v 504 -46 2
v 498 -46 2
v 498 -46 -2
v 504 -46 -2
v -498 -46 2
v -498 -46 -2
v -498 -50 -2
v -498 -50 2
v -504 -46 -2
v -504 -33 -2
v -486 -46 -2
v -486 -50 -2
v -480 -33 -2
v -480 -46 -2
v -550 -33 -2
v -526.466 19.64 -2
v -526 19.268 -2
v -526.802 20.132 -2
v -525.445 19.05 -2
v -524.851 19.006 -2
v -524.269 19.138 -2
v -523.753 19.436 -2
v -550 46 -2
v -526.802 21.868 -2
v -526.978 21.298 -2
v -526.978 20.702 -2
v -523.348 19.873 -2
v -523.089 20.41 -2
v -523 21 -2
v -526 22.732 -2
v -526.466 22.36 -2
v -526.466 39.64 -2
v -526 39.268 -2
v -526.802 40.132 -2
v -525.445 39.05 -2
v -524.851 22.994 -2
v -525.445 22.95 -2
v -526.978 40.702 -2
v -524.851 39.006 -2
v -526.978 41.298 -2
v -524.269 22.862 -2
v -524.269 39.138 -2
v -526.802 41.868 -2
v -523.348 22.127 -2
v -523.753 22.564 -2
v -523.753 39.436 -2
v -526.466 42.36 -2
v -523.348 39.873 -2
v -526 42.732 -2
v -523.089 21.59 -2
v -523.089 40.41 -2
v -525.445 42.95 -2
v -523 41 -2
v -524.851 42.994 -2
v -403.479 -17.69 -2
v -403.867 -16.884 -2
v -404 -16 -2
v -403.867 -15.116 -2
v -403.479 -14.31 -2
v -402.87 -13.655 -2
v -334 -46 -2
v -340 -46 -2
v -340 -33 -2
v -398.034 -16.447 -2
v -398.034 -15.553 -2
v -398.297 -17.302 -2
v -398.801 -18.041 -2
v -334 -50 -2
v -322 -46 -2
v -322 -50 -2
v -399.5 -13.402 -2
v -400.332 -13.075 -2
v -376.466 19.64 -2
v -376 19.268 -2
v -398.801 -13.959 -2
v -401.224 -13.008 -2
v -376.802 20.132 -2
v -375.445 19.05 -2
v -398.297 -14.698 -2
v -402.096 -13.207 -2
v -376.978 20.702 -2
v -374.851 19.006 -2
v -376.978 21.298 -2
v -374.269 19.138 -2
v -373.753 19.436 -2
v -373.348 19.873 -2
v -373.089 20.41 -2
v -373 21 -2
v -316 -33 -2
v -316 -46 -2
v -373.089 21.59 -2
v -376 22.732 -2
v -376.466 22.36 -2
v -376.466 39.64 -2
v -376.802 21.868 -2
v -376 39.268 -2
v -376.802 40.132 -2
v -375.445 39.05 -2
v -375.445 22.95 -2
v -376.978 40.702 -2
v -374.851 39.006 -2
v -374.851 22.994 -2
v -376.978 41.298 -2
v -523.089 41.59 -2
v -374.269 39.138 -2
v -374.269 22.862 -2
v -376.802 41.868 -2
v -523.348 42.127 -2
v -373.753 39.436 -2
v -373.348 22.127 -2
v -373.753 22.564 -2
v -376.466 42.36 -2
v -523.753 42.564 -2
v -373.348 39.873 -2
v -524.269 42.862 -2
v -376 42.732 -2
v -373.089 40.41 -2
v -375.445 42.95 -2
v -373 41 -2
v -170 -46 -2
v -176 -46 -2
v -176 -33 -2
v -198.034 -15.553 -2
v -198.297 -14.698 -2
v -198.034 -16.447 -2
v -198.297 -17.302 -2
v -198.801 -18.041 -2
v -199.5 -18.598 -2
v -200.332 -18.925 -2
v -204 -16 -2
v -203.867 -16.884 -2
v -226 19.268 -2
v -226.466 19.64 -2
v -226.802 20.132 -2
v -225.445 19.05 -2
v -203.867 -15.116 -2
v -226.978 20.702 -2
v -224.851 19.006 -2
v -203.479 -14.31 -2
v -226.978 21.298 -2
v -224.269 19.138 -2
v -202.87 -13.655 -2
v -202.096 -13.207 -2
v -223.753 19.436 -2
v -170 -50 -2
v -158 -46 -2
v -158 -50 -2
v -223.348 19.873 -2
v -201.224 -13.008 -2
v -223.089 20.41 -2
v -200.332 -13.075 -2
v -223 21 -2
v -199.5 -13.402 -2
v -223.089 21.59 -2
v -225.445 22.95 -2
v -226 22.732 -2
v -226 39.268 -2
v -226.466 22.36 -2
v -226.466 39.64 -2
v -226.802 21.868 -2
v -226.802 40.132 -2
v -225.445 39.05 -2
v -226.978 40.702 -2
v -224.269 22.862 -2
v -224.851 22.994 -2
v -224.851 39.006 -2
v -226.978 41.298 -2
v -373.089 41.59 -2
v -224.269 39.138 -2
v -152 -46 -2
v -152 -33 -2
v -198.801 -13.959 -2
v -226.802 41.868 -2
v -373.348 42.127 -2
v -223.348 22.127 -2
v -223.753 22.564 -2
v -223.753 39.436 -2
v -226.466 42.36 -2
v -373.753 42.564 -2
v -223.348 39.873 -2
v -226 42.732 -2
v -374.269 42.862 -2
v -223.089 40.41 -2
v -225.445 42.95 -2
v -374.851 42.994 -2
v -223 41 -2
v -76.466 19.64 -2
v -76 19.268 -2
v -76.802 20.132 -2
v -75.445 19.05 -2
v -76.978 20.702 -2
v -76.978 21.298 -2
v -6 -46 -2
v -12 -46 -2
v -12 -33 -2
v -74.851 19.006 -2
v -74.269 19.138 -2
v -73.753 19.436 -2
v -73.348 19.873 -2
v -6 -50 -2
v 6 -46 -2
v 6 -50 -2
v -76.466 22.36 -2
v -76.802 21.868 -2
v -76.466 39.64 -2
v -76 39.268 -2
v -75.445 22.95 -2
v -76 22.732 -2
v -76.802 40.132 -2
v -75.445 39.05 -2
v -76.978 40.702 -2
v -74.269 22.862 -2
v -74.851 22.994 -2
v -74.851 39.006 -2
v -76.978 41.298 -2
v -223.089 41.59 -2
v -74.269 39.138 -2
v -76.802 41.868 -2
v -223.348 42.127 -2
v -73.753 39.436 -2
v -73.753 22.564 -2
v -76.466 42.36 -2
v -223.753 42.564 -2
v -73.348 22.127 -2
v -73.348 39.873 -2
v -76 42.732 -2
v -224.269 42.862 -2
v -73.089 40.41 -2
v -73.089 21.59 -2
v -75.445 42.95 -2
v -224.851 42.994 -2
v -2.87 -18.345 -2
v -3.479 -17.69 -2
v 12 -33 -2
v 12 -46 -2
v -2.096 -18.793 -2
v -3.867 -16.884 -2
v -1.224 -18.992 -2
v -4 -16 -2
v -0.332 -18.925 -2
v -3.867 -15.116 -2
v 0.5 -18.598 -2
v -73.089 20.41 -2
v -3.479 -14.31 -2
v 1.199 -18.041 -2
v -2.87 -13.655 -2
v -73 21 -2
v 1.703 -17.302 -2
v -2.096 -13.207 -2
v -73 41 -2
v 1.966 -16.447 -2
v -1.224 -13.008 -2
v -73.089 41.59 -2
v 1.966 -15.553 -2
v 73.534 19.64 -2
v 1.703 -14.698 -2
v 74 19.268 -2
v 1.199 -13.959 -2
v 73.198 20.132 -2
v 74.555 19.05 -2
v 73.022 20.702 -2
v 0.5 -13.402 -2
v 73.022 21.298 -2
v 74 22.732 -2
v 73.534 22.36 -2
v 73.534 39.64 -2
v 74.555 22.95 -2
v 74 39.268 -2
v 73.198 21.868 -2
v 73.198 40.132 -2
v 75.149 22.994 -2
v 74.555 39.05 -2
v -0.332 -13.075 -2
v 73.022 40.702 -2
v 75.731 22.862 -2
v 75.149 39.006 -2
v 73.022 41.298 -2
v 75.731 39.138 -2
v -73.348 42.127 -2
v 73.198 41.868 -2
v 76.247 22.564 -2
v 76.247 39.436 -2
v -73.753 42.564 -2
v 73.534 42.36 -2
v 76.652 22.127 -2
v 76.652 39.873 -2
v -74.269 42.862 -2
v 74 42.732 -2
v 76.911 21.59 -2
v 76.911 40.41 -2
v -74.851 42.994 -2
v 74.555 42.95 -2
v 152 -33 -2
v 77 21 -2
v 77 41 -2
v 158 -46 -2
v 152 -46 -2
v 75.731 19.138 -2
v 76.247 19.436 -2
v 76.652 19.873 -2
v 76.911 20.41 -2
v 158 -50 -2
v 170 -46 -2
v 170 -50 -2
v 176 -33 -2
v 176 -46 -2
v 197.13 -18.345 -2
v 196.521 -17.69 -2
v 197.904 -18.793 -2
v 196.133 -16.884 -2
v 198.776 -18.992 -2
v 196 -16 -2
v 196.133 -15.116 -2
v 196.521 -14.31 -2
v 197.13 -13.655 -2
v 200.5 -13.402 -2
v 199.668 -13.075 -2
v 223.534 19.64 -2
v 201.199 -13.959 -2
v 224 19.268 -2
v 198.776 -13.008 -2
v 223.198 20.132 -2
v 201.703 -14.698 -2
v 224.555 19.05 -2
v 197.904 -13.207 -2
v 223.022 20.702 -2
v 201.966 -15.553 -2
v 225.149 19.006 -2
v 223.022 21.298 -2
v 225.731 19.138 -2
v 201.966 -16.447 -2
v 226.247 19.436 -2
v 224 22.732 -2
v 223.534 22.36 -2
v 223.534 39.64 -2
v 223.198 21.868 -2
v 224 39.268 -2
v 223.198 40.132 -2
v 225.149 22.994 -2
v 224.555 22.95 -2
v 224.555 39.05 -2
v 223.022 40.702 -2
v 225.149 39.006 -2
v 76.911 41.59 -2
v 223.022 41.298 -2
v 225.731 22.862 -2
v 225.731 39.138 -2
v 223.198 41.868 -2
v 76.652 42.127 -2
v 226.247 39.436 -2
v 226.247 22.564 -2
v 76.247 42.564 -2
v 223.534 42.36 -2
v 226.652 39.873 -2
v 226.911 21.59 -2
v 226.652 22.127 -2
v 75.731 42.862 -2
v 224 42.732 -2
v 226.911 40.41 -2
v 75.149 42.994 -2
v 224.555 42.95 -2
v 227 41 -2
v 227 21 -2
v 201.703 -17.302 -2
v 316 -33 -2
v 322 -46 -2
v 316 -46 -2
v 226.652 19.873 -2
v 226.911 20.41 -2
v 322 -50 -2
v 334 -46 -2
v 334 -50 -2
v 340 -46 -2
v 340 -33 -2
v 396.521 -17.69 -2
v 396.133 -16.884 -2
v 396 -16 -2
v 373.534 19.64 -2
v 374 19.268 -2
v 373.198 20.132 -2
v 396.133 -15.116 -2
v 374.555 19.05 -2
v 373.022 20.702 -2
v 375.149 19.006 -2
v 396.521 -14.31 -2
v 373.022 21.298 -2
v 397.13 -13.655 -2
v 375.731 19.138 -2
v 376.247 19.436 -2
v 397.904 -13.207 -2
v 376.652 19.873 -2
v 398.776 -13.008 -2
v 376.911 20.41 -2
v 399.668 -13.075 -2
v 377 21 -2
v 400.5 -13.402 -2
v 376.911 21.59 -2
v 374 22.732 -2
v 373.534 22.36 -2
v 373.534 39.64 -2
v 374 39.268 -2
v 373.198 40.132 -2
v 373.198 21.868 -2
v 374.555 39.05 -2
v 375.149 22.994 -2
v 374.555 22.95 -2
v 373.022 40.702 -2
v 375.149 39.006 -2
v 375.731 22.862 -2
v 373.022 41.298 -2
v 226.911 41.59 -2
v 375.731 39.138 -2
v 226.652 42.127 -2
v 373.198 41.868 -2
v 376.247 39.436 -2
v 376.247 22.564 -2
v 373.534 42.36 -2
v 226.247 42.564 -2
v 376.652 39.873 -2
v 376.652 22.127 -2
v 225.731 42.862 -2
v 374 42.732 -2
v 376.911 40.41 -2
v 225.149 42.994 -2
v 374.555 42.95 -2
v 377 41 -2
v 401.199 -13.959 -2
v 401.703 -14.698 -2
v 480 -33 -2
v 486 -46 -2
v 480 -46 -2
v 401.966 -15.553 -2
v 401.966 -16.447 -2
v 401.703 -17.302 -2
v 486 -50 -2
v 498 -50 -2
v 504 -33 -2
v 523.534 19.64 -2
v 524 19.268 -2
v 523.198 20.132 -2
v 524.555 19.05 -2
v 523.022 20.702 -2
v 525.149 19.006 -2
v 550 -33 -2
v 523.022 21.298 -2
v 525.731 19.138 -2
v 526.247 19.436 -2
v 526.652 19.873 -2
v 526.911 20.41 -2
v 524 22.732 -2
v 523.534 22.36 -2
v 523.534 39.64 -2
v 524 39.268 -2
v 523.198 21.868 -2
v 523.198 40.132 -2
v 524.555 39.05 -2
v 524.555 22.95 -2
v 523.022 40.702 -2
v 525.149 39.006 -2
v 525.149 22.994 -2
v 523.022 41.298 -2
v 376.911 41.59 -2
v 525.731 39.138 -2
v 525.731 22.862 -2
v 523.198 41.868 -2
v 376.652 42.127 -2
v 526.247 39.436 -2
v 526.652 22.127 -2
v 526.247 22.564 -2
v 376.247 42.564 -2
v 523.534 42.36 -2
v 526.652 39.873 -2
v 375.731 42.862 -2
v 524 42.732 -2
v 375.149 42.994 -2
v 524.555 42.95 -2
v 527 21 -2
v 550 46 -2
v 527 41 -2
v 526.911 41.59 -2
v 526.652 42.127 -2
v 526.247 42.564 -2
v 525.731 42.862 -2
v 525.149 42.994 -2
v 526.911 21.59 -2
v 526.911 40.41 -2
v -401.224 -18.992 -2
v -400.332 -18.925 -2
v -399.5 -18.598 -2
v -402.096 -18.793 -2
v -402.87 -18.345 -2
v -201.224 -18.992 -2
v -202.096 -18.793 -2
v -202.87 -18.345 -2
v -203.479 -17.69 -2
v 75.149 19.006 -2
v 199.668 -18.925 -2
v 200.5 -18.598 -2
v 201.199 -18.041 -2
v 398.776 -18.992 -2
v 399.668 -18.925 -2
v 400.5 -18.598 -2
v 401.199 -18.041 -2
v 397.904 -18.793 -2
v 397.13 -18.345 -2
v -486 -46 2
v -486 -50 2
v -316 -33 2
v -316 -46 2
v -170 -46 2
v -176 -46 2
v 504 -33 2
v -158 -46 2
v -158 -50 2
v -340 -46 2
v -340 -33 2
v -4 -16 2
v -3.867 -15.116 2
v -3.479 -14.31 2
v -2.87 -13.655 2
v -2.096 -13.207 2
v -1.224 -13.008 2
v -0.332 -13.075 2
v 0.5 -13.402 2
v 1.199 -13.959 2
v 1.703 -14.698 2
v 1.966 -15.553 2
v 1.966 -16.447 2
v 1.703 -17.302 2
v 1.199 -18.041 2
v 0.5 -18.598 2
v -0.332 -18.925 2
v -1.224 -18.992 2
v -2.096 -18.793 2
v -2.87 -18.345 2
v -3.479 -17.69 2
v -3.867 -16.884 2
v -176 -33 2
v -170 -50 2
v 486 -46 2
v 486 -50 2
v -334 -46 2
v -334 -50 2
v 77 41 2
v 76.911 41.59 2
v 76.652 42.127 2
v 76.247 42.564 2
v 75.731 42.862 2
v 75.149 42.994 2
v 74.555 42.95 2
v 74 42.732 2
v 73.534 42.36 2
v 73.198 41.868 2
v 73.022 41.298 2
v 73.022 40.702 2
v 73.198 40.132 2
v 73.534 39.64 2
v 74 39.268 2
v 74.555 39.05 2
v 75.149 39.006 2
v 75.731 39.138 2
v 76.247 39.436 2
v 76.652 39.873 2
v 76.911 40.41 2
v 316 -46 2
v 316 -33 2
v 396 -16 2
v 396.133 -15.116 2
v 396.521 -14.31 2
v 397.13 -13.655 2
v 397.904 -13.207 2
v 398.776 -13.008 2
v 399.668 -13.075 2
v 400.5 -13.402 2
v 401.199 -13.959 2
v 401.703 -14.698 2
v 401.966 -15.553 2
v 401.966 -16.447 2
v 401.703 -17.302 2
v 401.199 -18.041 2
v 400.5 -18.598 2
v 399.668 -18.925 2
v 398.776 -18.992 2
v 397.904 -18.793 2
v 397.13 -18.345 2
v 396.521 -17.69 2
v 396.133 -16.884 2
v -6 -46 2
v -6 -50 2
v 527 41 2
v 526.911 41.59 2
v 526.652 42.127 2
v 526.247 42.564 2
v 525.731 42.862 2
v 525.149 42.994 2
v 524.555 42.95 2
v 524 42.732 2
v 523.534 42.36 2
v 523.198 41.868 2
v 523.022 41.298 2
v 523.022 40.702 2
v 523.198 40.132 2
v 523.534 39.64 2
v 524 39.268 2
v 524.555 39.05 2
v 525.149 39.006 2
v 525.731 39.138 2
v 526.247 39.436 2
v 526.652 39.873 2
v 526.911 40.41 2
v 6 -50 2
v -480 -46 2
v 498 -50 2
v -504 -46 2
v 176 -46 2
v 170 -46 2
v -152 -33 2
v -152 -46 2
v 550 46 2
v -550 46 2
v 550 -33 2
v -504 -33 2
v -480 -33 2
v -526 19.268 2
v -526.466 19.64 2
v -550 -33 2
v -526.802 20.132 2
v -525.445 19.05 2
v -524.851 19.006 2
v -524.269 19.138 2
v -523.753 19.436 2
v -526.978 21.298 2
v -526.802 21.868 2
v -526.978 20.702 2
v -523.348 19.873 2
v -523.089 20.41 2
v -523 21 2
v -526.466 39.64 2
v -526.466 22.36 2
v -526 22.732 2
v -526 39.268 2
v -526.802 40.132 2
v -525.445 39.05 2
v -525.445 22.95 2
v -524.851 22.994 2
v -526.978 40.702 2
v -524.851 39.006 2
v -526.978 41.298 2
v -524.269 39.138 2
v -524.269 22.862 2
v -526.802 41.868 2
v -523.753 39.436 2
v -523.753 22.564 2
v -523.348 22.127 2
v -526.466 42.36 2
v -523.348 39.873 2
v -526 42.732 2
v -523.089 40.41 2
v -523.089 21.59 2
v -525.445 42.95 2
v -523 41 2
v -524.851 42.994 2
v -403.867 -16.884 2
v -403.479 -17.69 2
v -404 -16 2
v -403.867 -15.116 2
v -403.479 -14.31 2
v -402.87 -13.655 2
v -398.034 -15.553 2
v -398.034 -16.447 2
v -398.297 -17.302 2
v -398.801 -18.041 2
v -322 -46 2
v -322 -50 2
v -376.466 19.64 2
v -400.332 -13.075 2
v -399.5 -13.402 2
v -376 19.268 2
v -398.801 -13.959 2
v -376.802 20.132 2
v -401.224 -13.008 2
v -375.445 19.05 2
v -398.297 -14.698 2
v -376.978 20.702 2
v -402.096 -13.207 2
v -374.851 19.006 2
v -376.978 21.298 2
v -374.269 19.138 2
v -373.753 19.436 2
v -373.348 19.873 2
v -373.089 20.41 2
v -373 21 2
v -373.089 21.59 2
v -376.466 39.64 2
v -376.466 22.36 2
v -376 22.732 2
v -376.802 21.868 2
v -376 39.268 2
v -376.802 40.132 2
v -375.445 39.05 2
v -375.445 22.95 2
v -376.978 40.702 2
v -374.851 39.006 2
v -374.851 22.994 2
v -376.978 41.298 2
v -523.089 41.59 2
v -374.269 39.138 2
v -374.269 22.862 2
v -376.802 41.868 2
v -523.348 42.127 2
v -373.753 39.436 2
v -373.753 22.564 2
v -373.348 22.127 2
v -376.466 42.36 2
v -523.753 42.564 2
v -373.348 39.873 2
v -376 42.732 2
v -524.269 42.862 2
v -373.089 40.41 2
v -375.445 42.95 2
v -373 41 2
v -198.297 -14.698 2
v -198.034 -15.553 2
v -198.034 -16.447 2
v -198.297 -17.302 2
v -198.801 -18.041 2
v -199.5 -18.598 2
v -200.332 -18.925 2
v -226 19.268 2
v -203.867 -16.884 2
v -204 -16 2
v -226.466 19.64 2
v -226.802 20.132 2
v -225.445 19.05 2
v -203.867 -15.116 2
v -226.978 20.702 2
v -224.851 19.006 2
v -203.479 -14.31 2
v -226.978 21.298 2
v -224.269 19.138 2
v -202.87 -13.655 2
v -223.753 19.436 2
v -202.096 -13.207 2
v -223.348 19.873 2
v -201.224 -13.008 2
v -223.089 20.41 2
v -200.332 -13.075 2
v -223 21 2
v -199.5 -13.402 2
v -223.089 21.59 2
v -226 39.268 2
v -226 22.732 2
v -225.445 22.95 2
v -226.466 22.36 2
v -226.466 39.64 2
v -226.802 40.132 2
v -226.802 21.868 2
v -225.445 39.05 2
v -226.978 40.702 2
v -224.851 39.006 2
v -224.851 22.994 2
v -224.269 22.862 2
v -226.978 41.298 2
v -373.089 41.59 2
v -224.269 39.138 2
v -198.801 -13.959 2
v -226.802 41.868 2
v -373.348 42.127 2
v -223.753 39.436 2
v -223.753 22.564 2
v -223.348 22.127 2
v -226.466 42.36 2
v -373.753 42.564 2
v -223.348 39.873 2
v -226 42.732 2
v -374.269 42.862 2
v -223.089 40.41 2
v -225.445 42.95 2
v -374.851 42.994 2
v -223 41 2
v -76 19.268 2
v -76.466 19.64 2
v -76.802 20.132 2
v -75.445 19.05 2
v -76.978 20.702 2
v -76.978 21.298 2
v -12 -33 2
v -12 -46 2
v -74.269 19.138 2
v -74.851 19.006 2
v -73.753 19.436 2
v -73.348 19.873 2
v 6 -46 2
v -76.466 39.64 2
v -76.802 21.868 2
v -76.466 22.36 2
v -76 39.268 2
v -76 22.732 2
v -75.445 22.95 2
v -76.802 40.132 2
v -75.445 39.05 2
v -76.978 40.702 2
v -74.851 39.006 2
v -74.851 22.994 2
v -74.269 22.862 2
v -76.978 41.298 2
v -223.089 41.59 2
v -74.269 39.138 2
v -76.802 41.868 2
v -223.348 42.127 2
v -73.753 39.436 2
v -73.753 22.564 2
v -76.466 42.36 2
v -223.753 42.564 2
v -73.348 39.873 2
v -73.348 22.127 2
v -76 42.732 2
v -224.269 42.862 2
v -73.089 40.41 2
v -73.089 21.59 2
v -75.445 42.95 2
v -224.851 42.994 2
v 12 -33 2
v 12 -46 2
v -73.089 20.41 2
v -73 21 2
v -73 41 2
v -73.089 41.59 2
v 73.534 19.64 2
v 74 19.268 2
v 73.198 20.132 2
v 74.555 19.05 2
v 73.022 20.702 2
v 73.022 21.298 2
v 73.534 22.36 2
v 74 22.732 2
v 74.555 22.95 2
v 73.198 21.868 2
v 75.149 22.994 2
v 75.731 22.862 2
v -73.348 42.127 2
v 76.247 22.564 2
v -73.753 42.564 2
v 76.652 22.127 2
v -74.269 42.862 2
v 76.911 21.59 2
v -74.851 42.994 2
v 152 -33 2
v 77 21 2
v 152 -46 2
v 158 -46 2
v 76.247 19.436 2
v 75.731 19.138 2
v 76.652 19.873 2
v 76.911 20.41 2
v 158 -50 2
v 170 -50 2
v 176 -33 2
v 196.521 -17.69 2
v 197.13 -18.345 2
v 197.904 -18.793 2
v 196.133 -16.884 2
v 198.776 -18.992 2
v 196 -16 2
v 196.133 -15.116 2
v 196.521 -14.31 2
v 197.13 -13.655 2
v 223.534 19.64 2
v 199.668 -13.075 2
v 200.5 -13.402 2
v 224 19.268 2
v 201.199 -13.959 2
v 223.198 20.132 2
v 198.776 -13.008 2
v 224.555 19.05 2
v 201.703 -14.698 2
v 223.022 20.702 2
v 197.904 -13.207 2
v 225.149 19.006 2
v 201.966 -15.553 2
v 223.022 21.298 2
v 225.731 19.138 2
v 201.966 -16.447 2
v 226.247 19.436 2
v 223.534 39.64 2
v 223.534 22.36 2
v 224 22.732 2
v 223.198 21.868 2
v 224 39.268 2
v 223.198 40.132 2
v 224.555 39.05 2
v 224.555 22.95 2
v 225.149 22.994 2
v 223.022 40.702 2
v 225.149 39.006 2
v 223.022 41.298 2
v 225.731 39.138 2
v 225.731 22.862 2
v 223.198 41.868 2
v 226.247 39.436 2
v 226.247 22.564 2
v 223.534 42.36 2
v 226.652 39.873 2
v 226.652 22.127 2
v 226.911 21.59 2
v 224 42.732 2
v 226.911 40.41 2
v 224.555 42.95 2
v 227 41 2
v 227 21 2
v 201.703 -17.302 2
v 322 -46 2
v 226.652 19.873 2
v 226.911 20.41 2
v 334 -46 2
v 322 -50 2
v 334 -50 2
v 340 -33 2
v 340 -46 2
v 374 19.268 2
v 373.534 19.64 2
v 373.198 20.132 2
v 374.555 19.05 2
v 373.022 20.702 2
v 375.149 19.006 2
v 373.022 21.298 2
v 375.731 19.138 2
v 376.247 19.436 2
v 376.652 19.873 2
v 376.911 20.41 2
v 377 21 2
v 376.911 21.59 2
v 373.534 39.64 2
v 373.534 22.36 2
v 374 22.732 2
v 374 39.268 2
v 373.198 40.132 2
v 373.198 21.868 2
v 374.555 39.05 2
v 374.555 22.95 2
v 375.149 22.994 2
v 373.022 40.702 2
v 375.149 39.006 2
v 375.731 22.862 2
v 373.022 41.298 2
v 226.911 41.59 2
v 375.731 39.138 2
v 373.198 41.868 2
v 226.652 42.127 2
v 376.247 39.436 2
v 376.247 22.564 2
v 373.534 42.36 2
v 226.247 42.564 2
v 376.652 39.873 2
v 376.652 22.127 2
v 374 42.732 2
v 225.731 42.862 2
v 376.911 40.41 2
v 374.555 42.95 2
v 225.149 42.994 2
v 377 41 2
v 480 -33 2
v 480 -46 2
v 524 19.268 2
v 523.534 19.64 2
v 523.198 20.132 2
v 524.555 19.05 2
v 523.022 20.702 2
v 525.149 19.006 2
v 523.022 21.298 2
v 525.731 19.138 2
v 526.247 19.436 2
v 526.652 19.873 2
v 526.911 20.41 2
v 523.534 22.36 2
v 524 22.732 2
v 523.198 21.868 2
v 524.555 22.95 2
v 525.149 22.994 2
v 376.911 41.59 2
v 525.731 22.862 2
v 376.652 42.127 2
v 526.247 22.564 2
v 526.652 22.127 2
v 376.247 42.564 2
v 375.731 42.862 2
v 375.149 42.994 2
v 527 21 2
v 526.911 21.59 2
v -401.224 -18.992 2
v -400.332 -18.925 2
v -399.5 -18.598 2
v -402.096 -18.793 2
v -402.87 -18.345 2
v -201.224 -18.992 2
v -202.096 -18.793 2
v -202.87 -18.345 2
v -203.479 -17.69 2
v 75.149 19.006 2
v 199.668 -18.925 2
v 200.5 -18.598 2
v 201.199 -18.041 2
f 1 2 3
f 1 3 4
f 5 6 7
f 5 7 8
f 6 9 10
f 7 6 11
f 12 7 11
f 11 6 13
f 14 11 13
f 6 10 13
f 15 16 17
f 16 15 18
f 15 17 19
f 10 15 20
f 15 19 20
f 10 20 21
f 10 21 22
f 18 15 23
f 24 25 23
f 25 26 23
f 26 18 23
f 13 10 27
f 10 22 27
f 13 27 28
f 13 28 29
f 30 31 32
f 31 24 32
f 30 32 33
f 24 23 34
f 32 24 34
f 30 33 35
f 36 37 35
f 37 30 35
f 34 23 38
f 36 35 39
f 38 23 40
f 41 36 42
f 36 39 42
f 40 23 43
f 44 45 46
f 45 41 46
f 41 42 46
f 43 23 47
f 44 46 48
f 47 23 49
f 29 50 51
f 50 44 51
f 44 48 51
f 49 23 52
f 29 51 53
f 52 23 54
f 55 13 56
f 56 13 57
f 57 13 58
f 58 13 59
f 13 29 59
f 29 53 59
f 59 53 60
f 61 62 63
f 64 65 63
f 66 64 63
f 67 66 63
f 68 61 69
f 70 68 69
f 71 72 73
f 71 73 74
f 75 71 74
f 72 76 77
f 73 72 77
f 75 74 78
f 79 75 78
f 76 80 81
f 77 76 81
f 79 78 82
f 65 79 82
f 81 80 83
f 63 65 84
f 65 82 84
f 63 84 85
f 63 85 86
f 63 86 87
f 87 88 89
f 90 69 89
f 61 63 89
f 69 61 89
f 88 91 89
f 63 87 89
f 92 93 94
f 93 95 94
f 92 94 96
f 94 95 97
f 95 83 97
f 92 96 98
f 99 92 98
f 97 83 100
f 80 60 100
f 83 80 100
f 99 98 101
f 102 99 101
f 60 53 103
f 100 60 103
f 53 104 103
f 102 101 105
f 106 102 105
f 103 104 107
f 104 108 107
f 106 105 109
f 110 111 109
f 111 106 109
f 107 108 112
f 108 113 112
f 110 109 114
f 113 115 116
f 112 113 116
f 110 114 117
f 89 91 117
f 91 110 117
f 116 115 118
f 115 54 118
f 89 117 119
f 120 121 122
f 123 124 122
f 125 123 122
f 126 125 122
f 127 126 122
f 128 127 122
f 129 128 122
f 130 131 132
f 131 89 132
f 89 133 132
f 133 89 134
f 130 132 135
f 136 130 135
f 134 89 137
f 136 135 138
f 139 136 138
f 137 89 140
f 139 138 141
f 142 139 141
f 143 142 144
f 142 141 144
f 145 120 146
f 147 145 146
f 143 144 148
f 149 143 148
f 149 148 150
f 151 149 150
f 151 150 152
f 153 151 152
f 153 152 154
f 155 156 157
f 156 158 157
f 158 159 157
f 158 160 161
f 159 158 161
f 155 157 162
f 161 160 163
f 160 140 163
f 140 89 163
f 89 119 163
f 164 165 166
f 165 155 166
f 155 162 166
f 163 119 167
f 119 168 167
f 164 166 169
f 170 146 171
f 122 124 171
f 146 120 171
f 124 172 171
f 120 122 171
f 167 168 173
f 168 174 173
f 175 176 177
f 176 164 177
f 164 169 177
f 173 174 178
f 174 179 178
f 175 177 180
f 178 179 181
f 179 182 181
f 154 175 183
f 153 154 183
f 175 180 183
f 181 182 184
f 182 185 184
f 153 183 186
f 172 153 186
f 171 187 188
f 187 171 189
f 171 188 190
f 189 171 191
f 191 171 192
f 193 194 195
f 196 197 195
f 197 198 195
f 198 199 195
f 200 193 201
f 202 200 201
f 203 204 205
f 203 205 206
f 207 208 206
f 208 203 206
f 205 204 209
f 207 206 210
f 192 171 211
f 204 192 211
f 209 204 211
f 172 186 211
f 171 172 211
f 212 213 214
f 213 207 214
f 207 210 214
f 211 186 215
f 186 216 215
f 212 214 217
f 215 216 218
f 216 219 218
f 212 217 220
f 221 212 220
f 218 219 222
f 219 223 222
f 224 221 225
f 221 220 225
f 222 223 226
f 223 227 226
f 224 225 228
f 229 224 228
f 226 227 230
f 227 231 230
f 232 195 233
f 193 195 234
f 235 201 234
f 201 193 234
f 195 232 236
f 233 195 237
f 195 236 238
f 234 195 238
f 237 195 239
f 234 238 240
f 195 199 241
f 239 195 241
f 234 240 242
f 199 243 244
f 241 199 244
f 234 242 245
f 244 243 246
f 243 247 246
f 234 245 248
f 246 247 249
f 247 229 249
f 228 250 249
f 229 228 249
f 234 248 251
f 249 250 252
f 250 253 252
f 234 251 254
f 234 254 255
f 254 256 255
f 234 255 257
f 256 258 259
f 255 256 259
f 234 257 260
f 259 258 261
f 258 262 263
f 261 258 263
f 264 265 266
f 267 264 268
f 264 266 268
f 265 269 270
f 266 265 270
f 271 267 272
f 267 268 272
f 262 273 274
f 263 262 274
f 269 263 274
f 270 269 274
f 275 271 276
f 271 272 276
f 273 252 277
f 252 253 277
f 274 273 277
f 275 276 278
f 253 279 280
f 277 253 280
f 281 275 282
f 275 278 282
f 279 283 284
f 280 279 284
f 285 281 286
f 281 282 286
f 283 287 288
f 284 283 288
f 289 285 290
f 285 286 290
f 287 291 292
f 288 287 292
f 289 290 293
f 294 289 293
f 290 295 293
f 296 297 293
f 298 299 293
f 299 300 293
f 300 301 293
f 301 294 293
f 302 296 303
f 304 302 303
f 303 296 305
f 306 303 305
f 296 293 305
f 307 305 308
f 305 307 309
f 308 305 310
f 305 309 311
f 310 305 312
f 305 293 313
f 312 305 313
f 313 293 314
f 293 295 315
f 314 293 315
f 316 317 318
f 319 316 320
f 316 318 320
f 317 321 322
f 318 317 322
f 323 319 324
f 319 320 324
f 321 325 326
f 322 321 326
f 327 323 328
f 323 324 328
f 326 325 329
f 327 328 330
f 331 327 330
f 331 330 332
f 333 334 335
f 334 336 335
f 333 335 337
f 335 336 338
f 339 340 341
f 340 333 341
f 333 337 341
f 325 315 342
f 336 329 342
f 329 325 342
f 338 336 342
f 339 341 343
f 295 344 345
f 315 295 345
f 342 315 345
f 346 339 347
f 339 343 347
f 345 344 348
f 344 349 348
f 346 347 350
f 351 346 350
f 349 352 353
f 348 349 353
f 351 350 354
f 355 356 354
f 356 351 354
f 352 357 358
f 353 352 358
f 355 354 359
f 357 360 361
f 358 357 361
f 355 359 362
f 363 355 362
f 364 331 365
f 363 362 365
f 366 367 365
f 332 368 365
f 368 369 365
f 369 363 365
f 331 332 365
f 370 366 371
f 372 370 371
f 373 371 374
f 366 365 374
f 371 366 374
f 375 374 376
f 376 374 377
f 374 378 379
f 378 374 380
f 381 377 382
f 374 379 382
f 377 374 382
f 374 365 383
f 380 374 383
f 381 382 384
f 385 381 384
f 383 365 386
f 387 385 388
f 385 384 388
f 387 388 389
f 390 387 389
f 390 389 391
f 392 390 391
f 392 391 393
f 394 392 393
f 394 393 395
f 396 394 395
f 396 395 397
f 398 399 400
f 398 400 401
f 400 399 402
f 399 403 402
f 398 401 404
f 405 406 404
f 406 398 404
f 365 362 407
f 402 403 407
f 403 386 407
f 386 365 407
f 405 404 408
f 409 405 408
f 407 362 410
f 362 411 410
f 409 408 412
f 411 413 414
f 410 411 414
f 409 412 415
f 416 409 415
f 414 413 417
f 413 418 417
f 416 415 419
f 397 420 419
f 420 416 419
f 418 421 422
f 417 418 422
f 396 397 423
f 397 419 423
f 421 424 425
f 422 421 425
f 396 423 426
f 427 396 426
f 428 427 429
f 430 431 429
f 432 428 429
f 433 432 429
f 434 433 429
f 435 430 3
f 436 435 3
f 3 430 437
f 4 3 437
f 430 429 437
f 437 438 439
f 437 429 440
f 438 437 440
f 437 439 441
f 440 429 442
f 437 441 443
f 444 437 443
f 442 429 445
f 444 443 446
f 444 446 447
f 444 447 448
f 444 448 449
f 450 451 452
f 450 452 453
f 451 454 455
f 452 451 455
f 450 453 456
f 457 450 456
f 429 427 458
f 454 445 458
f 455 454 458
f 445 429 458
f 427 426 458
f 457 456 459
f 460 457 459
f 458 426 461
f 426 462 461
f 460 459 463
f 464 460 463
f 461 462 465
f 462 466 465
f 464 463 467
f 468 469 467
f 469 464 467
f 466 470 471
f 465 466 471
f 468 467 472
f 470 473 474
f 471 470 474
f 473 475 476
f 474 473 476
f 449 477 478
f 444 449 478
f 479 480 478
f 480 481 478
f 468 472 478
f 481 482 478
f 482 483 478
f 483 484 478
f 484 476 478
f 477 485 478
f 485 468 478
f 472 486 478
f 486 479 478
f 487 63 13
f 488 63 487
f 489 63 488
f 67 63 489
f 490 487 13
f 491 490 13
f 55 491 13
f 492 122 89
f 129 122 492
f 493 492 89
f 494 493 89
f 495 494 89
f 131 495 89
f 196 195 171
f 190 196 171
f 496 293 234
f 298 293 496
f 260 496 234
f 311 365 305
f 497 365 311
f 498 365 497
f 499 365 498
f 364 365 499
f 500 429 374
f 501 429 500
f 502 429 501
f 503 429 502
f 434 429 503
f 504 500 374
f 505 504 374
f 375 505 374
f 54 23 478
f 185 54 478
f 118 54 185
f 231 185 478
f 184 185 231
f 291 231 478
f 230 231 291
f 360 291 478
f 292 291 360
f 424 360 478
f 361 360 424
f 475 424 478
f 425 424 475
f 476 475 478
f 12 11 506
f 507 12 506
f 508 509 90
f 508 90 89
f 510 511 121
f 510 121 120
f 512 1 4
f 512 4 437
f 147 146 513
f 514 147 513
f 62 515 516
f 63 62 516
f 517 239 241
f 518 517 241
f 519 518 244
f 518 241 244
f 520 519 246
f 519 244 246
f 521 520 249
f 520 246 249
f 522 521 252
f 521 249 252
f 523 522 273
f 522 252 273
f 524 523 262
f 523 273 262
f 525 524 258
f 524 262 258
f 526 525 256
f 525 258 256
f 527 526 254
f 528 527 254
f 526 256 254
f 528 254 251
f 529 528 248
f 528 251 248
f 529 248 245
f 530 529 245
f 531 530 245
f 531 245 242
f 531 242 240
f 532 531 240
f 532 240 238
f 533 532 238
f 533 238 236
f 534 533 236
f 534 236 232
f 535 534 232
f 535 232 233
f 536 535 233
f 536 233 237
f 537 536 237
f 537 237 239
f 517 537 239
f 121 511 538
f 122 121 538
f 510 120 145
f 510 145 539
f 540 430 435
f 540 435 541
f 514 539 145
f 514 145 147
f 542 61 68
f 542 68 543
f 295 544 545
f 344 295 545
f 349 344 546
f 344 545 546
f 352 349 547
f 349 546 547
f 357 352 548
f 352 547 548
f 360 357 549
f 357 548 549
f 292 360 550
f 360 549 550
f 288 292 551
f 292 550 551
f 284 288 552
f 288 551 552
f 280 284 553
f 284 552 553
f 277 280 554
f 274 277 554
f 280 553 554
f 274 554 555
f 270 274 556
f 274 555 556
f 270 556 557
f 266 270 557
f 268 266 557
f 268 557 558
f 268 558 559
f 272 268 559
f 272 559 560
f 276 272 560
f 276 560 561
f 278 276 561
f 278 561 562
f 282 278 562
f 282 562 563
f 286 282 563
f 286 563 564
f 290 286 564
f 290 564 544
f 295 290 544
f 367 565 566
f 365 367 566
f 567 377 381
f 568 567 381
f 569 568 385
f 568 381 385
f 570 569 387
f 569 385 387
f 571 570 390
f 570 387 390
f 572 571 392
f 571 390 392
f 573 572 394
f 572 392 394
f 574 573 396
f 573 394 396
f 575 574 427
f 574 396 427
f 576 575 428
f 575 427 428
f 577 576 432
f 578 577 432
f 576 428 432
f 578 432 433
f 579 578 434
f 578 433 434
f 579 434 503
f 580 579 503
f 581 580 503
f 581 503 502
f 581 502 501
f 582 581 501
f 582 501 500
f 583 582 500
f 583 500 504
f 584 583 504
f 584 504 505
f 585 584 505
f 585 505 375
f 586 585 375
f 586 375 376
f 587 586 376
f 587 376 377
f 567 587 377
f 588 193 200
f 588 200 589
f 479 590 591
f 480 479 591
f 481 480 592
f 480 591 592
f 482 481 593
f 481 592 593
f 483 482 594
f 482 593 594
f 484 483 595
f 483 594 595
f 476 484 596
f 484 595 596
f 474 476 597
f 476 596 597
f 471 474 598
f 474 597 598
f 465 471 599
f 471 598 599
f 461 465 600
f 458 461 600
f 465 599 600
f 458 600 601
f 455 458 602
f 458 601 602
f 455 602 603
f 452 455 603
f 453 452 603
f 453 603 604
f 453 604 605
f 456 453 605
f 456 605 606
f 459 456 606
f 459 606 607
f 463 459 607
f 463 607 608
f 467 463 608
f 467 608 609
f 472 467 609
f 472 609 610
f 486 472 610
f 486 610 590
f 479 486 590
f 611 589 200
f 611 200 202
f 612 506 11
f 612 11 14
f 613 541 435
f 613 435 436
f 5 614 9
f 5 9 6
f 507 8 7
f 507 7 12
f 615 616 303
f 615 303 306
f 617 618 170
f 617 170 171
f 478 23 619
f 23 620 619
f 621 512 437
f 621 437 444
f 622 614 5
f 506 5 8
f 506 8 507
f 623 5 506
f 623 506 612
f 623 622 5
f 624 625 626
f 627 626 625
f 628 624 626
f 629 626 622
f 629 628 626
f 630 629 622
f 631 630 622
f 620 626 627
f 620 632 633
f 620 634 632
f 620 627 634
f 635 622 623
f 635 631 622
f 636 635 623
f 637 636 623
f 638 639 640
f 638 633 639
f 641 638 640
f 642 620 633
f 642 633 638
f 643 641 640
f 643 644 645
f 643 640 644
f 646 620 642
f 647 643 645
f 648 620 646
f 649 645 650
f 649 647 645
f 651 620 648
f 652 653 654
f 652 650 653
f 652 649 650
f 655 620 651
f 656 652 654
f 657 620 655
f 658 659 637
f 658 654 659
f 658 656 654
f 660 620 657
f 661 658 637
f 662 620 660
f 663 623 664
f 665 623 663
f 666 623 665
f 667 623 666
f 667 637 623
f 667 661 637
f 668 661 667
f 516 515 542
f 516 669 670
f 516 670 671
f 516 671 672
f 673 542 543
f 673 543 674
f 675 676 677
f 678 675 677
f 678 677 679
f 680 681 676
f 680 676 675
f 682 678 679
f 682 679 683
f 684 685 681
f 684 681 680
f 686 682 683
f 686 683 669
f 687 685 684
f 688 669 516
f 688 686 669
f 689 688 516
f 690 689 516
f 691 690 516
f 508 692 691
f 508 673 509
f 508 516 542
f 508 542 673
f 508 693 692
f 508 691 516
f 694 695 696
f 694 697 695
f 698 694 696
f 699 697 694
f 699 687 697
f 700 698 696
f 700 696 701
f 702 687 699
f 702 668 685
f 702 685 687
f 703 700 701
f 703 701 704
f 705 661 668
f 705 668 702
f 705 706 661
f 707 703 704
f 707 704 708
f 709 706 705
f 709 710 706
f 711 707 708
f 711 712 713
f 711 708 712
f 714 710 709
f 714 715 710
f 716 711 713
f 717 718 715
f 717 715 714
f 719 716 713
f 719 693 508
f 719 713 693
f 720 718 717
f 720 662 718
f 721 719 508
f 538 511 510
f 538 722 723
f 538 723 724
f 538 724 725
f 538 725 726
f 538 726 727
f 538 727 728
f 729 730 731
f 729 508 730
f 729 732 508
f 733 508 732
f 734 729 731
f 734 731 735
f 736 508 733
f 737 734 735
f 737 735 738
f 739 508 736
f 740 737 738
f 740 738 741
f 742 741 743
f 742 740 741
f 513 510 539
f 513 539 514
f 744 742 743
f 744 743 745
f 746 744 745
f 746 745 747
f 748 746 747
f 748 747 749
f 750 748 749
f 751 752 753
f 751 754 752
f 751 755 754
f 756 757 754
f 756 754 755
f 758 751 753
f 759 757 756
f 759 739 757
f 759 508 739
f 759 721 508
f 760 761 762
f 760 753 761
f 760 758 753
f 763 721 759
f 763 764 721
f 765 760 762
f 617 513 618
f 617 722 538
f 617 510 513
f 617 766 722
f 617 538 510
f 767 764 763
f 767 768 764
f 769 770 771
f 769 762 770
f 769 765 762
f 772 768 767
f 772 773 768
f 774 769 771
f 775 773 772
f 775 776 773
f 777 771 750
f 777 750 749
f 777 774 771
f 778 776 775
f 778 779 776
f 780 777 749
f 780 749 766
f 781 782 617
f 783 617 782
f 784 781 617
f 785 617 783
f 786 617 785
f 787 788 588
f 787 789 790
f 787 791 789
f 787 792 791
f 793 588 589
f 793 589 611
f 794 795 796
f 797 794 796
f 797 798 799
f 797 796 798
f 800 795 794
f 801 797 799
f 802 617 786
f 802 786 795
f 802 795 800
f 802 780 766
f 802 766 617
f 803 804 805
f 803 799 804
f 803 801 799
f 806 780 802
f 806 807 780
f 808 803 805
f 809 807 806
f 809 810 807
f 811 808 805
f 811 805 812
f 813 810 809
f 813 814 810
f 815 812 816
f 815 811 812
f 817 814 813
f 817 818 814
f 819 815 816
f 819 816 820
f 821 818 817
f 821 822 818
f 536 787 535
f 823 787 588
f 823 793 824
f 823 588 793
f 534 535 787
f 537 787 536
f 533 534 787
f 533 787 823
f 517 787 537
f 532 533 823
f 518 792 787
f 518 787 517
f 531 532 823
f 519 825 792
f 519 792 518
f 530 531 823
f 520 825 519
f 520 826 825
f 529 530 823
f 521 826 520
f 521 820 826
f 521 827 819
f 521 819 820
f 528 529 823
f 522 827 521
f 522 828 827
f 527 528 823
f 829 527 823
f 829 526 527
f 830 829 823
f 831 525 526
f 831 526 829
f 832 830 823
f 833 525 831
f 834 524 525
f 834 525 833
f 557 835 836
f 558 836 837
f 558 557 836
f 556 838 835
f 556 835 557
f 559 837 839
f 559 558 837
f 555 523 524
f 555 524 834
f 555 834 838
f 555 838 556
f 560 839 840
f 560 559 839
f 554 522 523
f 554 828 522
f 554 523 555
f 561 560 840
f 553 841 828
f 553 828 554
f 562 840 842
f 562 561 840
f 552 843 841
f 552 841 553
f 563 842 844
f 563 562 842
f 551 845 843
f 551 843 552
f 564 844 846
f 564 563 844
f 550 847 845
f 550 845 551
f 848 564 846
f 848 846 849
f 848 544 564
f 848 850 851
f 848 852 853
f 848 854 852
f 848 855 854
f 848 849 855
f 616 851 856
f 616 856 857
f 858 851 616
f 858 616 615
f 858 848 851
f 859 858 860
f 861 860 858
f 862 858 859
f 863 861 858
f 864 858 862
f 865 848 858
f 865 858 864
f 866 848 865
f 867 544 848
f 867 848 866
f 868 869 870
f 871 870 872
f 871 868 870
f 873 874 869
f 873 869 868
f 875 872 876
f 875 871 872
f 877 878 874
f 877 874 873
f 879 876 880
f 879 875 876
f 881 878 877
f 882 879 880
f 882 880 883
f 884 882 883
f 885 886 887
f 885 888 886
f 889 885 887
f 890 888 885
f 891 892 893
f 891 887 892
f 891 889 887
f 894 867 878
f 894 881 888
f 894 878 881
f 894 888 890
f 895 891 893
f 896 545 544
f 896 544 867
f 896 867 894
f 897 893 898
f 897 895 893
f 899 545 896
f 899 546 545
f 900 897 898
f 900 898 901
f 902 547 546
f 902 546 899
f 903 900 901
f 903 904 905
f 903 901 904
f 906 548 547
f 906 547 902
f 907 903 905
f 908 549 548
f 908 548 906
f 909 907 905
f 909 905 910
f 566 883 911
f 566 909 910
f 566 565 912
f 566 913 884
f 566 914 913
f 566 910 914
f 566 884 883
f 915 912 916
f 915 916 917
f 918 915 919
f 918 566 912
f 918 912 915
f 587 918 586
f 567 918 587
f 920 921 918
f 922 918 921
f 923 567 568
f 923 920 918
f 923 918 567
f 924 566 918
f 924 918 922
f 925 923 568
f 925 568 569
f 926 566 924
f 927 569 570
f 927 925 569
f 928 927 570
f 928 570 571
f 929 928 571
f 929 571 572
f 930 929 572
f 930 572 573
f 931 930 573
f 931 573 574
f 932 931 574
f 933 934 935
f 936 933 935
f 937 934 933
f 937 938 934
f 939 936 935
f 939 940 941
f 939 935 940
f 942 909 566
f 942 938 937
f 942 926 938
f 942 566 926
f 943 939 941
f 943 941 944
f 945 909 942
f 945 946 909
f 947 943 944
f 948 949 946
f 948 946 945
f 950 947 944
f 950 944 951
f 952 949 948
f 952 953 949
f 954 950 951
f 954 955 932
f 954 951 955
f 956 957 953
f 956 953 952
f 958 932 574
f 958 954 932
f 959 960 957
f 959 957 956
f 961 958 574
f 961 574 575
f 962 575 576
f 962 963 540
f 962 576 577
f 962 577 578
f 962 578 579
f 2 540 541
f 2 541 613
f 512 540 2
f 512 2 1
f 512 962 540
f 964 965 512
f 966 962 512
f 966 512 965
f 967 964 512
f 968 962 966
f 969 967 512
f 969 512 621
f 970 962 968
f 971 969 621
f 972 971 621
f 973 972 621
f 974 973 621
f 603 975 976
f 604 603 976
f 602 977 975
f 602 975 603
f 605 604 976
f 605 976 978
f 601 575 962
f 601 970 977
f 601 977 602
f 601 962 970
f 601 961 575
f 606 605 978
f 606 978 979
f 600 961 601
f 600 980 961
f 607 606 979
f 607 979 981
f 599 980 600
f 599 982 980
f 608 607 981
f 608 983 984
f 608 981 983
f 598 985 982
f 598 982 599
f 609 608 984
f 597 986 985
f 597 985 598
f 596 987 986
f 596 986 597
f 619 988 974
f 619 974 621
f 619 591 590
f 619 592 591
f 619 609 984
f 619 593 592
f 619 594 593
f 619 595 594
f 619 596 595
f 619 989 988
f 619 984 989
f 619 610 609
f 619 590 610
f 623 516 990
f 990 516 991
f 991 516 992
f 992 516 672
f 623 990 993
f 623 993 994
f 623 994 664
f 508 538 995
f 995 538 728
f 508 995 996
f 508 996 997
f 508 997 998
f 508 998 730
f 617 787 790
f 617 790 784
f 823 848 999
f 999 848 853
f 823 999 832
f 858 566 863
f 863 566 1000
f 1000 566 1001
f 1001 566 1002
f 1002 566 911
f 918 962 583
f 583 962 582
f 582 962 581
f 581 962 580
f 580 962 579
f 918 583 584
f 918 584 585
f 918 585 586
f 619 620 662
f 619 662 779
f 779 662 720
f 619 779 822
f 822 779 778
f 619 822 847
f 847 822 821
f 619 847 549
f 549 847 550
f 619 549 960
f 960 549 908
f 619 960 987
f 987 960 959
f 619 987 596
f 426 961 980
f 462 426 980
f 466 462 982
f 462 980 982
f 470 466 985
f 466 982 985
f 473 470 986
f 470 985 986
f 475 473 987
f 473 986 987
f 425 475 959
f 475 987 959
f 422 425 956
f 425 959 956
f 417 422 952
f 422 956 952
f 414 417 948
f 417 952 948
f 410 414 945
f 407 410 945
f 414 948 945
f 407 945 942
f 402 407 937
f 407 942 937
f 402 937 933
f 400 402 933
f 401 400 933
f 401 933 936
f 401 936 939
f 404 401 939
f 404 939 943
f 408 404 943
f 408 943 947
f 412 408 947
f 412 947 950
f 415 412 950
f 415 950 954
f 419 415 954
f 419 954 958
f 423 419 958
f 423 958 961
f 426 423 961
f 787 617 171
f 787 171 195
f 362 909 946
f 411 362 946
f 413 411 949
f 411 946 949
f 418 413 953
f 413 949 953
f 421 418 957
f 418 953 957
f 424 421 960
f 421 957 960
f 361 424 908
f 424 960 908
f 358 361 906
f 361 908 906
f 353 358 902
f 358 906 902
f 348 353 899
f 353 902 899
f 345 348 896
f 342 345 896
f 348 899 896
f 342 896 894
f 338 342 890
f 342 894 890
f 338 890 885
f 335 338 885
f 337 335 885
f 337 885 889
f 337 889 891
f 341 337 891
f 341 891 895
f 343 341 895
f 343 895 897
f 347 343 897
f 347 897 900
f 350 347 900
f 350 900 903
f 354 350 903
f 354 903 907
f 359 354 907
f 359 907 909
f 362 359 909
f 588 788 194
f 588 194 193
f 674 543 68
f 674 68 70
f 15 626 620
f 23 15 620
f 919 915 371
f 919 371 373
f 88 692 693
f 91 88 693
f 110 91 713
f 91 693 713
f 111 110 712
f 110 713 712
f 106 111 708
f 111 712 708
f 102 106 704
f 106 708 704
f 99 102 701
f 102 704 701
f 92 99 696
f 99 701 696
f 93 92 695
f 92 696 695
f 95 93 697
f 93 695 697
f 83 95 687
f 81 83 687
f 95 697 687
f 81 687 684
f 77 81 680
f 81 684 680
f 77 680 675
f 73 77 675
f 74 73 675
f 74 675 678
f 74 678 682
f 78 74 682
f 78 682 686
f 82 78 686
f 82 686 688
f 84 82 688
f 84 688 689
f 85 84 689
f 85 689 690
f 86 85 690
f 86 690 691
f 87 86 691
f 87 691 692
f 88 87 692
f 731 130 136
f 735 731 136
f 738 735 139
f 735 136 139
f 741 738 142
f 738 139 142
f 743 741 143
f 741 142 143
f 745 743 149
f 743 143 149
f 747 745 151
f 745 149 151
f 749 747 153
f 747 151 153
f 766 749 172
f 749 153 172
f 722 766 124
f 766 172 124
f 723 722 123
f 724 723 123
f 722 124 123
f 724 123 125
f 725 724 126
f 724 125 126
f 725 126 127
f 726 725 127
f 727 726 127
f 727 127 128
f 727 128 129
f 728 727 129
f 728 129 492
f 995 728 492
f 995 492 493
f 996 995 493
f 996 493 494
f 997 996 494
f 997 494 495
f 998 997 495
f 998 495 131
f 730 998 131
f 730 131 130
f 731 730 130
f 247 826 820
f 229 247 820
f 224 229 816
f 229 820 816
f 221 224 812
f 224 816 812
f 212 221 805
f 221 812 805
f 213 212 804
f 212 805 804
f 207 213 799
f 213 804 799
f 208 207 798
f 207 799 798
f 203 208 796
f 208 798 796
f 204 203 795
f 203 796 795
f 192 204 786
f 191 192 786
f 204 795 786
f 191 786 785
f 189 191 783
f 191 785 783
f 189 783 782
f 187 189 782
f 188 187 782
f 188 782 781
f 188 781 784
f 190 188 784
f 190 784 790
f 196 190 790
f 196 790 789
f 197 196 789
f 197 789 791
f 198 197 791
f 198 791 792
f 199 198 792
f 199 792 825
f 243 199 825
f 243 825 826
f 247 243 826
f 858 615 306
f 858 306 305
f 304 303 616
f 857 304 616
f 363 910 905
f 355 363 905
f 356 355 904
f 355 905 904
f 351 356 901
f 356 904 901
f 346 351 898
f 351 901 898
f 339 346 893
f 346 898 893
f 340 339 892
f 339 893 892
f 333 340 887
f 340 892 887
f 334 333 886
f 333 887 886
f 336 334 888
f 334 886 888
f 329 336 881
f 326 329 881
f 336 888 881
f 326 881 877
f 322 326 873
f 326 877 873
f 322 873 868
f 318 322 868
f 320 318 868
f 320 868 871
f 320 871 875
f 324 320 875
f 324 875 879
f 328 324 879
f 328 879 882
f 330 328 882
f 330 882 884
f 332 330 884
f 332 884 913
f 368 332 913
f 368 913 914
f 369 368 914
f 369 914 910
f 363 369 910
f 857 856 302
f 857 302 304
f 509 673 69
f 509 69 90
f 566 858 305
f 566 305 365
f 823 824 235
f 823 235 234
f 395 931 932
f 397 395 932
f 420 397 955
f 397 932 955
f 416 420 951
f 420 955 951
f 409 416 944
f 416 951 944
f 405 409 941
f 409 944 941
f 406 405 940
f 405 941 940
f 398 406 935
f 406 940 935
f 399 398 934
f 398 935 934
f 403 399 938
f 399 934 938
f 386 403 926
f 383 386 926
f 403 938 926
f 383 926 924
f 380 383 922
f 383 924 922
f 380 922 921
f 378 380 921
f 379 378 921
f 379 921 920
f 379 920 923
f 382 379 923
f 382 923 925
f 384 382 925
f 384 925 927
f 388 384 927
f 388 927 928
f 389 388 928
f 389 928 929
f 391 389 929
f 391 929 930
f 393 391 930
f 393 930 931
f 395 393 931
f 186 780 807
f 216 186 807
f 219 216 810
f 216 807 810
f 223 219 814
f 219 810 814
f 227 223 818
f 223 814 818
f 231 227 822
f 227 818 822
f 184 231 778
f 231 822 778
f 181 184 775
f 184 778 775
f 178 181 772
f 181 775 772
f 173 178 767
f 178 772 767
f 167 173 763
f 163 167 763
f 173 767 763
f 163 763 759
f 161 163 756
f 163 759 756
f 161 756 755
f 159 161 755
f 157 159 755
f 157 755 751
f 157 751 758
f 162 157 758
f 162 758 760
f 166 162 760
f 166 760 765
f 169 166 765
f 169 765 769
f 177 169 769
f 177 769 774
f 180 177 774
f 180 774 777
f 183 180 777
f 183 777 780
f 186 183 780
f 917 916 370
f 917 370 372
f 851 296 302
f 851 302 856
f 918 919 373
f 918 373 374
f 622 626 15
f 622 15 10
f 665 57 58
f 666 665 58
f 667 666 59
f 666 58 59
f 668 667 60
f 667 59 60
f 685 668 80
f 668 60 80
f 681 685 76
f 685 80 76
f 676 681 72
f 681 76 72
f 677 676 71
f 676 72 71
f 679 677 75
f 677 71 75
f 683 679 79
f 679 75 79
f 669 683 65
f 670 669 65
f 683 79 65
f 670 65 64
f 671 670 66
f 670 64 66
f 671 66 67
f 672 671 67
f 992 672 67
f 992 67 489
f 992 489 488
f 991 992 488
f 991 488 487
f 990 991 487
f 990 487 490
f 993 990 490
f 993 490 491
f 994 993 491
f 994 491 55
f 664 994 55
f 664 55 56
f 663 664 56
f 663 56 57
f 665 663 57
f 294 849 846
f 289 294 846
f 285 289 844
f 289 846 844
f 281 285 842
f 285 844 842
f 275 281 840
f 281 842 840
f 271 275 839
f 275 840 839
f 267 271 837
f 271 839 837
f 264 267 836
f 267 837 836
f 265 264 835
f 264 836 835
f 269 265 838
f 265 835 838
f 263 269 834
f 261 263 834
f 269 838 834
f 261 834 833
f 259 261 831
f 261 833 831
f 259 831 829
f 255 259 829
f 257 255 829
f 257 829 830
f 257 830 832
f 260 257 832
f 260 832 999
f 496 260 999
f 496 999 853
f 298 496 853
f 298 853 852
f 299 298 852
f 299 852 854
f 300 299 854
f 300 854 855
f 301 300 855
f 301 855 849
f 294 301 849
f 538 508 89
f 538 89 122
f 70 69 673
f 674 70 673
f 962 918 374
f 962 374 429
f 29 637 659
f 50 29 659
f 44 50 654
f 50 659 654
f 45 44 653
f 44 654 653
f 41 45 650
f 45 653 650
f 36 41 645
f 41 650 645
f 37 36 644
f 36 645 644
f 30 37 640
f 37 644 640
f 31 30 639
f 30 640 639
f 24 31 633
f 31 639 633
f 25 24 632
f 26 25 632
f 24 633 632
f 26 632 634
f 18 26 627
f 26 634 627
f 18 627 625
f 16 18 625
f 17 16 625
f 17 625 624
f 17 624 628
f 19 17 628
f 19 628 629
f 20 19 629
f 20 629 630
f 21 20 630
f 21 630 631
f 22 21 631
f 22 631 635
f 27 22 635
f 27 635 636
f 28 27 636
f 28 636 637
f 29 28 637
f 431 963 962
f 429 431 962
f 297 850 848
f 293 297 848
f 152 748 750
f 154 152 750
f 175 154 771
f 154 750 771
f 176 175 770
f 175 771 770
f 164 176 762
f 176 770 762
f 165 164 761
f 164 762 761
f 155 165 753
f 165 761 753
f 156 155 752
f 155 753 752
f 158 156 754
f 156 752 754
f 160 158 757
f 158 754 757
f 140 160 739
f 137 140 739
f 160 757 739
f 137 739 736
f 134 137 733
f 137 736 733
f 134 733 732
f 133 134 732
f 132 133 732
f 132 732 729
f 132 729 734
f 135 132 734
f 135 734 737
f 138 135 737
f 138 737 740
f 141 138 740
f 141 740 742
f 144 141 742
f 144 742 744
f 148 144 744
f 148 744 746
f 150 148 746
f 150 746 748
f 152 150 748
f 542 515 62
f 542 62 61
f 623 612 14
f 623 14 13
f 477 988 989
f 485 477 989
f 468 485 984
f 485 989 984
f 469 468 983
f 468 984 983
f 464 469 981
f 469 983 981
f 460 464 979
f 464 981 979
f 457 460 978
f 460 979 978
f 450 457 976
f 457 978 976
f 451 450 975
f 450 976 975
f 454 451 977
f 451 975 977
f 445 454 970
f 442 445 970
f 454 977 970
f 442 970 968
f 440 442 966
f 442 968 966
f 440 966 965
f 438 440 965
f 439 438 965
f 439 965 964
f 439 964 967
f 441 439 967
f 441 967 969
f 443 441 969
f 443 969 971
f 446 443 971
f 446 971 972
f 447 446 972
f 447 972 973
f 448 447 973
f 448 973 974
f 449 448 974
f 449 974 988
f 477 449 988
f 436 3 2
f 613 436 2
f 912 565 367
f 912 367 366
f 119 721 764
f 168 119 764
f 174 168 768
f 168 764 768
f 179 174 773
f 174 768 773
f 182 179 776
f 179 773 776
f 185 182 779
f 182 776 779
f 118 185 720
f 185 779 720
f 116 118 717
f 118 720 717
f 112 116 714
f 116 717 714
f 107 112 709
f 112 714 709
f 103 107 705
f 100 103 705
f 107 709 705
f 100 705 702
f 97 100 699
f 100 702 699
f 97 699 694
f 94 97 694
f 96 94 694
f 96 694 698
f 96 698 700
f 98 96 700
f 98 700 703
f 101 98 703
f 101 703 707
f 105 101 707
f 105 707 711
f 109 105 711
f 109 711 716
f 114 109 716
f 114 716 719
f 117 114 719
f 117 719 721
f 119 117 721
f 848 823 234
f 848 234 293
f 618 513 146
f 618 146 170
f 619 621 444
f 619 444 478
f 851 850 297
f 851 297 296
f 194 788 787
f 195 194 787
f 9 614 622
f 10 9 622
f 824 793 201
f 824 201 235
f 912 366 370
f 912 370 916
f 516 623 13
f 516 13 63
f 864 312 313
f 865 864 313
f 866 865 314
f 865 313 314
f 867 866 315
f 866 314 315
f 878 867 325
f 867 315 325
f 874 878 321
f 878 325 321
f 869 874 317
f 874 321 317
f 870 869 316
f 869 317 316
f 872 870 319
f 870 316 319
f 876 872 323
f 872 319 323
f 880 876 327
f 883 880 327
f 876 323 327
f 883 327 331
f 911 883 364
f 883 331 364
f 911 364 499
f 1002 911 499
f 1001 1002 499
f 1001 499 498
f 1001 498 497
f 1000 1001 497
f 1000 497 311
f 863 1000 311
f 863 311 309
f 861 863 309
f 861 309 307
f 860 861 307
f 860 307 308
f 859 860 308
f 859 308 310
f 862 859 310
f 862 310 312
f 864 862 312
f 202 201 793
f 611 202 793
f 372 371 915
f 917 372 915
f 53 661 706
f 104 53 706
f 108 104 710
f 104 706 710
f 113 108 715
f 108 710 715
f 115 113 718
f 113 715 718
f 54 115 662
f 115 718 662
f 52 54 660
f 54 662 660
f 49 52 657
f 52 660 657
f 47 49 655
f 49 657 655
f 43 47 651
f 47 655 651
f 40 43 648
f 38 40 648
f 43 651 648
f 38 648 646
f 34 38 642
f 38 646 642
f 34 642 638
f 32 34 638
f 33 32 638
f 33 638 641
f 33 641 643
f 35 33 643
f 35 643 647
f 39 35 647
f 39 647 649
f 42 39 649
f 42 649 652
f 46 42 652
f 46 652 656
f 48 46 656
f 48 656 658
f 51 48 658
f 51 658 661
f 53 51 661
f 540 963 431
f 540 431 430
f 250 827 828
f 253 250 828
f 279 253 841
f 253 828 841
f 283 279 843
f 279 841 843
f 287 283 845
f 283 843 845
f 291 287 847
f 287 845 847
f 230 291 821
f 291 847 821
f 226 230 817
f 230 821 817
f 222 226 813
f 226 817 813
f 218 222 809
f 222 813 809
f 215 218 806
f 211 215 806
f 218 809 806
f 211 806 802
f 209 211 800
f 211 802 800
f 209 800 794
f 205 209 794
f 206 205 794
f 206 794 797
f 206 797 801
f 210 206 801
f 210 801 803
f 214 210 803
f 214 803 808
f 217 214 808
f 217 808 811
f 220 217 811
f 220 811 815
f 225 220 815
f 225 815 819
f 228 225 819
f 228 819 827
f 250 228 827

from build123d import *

# Parameters (mm, degrees)
SKETCH_1_W             = 1100
SKETCH_1_H             = 92
EXTRUDE_1_DEPTH        = 2
SKETCH_2_W             = 46
SKETCH_2_H             = 13
SKETCH_2_W_2           = 140
CUT_EXTRUDE_1_DEPTH    = 552.934778756
SKETCH_3_R             = 2
CUT_EXTRUDE_2_DEPTH    = 552.934778756
PATTERN_LINEAR_1_COUNT = 8
PATTERN_LINEAR_1_PITCH = 150
SKETCH_4_R             = 3
CUT_EXTRUDE_3_DEPTH    = 552.934778756
PATTERN_LINEAR_2_COUNT = 5
PATTERN_LINEAR_2_PITCH = 200
SKETCH_5_W             = 12
SKETCH_5_H             = 4
EXTRUDE_2_DEPTH        = 4


with BuildPart() as part:
    # Эскиз1 → Бобышка-Вытянуть1 (new, symmetric)
    with BuildSketch(Plane.XY):
        Rectangle(SKETCH_1_W, SKETCH_1_H)
    extrude(amount=EXTRUDE_1_DEPTH, both=True)

    # Эскиз2 → Вырез-Вытянуть1 (cut, through all)
    with BuildSketch(Plane.XY.offset(2)):
        with Locations((-527, -39.5)):
            Rectangle(SKETCH_2_W, SKETCH_2_H)
        with Locations((527, -39.5)):
            Rectangle(SKETCH_2_W, SKETCH_2_H)
        with Locations((-410, -39.5)):
            Rectangle(SKETCH_2_W_2, SKETCH_2_H)
        with Locations((-246, -39.5)):
            Rectangle(SKETCH_2_W_2, SKETCH_2_H)
        with Locations((-82, -39.5)):
            Rectangle(SKETCH_2_W_2, SKETCH_2_H)
        with Locations((82, -39.5)):
            Rectangle(SKETCH_2_W_2, SKETCH_2_H)
        with Locations((246, -39.5)):
            Rectangle(SKETCH_2_W_2, SKETCH_2_H)
        with Locations((410, -39.5)):
            Rectangle(SKETCH_2_W_2, SKETCH_2_H)
    extrude(amount=-CUT_EXTRUDE_1_DEPTH, mode=Mode.SUBTRACT)

    # Эскиз3 → Вырез-Вытянуть2 (cut, through all)
    with BuildSketch(Plane.XY.offset(2)):
        with Locations((-525, 41)):
            Circle(SKETCH_3_R)
        with Locations((-525, 21)):
            Circle(SKETCH_3_R)
    cut_extrude_2 = extrude(amount=-CUT_EXTRUDE_2_DEPTH, mode=Mode.SUBTRACT)

    # Линейный массив1: Вырез-Вытянуть2 ×8
    with Locations(*[(i * PATTERN_LINEAR_1_PITCH, 0, 0) for i in range(1, PATTERN_LINEAR_1_COUNT)]):
        add(cut_extrude_2, mode=Mode.SUBTRACT)

    # Эскиз4 → Вырез-Вытянуть3 (cut, through all)
    with BuildSketch(Plane(origin=(0, 0, -2), x_dir=(-1, 0, 0), z_dir=(0, 0, -1))):
        with Locations((-399, -16)):
            Circle(SKETCH_4_R)
    cut_extrude_3 = extrude(amount=-CUT_EXTRUDE_3_DEPTH, mode=Mode.SUBTRACT)

    # Линейный массив2: Вырез-Вытянуть3 ×5
    with Locations(*[(-i * PATTERN_LINEAR_2_PITCH, 0, 0) for i in range(1, PATTERN_LINEAR_2_COUNT)]):
        add(cut_extrude_3, mode=Mode.SUBTRACT)

    # Эскиз5 → Бобышка-Вытянуть2 (add)
    with BuildSketch(Plane.XZ.offset(46)):
        with Locations((492, 0)):
            Rectangle(SKETCH_5_W, SKETCH_5_H)
        with Locations((328, 0)):
            Rectangle(SKETCH_5_W, SKETCH_5_H)
        with Locations((164, 0)):
            Rectangle(SKETCH_5_W, SKETCH_5_H)
        Rectangle(SKETCH_5_W, SKETCH_5_H)
        with Locations((-492, 0)):
            Rectangle(SKETCH_5_W, SKETCH_5_H)
        with Locations((-328, 0)):
            Rectangle(SKETCH_5_W, SKETCH_5_H)
        with Locations((-164, 0)):
            Rectangle(SKETCH_5_W, SKETCH_5_H)
    extrude(amount=EXTRUDE_2_DEPTH)


solid = part.part
